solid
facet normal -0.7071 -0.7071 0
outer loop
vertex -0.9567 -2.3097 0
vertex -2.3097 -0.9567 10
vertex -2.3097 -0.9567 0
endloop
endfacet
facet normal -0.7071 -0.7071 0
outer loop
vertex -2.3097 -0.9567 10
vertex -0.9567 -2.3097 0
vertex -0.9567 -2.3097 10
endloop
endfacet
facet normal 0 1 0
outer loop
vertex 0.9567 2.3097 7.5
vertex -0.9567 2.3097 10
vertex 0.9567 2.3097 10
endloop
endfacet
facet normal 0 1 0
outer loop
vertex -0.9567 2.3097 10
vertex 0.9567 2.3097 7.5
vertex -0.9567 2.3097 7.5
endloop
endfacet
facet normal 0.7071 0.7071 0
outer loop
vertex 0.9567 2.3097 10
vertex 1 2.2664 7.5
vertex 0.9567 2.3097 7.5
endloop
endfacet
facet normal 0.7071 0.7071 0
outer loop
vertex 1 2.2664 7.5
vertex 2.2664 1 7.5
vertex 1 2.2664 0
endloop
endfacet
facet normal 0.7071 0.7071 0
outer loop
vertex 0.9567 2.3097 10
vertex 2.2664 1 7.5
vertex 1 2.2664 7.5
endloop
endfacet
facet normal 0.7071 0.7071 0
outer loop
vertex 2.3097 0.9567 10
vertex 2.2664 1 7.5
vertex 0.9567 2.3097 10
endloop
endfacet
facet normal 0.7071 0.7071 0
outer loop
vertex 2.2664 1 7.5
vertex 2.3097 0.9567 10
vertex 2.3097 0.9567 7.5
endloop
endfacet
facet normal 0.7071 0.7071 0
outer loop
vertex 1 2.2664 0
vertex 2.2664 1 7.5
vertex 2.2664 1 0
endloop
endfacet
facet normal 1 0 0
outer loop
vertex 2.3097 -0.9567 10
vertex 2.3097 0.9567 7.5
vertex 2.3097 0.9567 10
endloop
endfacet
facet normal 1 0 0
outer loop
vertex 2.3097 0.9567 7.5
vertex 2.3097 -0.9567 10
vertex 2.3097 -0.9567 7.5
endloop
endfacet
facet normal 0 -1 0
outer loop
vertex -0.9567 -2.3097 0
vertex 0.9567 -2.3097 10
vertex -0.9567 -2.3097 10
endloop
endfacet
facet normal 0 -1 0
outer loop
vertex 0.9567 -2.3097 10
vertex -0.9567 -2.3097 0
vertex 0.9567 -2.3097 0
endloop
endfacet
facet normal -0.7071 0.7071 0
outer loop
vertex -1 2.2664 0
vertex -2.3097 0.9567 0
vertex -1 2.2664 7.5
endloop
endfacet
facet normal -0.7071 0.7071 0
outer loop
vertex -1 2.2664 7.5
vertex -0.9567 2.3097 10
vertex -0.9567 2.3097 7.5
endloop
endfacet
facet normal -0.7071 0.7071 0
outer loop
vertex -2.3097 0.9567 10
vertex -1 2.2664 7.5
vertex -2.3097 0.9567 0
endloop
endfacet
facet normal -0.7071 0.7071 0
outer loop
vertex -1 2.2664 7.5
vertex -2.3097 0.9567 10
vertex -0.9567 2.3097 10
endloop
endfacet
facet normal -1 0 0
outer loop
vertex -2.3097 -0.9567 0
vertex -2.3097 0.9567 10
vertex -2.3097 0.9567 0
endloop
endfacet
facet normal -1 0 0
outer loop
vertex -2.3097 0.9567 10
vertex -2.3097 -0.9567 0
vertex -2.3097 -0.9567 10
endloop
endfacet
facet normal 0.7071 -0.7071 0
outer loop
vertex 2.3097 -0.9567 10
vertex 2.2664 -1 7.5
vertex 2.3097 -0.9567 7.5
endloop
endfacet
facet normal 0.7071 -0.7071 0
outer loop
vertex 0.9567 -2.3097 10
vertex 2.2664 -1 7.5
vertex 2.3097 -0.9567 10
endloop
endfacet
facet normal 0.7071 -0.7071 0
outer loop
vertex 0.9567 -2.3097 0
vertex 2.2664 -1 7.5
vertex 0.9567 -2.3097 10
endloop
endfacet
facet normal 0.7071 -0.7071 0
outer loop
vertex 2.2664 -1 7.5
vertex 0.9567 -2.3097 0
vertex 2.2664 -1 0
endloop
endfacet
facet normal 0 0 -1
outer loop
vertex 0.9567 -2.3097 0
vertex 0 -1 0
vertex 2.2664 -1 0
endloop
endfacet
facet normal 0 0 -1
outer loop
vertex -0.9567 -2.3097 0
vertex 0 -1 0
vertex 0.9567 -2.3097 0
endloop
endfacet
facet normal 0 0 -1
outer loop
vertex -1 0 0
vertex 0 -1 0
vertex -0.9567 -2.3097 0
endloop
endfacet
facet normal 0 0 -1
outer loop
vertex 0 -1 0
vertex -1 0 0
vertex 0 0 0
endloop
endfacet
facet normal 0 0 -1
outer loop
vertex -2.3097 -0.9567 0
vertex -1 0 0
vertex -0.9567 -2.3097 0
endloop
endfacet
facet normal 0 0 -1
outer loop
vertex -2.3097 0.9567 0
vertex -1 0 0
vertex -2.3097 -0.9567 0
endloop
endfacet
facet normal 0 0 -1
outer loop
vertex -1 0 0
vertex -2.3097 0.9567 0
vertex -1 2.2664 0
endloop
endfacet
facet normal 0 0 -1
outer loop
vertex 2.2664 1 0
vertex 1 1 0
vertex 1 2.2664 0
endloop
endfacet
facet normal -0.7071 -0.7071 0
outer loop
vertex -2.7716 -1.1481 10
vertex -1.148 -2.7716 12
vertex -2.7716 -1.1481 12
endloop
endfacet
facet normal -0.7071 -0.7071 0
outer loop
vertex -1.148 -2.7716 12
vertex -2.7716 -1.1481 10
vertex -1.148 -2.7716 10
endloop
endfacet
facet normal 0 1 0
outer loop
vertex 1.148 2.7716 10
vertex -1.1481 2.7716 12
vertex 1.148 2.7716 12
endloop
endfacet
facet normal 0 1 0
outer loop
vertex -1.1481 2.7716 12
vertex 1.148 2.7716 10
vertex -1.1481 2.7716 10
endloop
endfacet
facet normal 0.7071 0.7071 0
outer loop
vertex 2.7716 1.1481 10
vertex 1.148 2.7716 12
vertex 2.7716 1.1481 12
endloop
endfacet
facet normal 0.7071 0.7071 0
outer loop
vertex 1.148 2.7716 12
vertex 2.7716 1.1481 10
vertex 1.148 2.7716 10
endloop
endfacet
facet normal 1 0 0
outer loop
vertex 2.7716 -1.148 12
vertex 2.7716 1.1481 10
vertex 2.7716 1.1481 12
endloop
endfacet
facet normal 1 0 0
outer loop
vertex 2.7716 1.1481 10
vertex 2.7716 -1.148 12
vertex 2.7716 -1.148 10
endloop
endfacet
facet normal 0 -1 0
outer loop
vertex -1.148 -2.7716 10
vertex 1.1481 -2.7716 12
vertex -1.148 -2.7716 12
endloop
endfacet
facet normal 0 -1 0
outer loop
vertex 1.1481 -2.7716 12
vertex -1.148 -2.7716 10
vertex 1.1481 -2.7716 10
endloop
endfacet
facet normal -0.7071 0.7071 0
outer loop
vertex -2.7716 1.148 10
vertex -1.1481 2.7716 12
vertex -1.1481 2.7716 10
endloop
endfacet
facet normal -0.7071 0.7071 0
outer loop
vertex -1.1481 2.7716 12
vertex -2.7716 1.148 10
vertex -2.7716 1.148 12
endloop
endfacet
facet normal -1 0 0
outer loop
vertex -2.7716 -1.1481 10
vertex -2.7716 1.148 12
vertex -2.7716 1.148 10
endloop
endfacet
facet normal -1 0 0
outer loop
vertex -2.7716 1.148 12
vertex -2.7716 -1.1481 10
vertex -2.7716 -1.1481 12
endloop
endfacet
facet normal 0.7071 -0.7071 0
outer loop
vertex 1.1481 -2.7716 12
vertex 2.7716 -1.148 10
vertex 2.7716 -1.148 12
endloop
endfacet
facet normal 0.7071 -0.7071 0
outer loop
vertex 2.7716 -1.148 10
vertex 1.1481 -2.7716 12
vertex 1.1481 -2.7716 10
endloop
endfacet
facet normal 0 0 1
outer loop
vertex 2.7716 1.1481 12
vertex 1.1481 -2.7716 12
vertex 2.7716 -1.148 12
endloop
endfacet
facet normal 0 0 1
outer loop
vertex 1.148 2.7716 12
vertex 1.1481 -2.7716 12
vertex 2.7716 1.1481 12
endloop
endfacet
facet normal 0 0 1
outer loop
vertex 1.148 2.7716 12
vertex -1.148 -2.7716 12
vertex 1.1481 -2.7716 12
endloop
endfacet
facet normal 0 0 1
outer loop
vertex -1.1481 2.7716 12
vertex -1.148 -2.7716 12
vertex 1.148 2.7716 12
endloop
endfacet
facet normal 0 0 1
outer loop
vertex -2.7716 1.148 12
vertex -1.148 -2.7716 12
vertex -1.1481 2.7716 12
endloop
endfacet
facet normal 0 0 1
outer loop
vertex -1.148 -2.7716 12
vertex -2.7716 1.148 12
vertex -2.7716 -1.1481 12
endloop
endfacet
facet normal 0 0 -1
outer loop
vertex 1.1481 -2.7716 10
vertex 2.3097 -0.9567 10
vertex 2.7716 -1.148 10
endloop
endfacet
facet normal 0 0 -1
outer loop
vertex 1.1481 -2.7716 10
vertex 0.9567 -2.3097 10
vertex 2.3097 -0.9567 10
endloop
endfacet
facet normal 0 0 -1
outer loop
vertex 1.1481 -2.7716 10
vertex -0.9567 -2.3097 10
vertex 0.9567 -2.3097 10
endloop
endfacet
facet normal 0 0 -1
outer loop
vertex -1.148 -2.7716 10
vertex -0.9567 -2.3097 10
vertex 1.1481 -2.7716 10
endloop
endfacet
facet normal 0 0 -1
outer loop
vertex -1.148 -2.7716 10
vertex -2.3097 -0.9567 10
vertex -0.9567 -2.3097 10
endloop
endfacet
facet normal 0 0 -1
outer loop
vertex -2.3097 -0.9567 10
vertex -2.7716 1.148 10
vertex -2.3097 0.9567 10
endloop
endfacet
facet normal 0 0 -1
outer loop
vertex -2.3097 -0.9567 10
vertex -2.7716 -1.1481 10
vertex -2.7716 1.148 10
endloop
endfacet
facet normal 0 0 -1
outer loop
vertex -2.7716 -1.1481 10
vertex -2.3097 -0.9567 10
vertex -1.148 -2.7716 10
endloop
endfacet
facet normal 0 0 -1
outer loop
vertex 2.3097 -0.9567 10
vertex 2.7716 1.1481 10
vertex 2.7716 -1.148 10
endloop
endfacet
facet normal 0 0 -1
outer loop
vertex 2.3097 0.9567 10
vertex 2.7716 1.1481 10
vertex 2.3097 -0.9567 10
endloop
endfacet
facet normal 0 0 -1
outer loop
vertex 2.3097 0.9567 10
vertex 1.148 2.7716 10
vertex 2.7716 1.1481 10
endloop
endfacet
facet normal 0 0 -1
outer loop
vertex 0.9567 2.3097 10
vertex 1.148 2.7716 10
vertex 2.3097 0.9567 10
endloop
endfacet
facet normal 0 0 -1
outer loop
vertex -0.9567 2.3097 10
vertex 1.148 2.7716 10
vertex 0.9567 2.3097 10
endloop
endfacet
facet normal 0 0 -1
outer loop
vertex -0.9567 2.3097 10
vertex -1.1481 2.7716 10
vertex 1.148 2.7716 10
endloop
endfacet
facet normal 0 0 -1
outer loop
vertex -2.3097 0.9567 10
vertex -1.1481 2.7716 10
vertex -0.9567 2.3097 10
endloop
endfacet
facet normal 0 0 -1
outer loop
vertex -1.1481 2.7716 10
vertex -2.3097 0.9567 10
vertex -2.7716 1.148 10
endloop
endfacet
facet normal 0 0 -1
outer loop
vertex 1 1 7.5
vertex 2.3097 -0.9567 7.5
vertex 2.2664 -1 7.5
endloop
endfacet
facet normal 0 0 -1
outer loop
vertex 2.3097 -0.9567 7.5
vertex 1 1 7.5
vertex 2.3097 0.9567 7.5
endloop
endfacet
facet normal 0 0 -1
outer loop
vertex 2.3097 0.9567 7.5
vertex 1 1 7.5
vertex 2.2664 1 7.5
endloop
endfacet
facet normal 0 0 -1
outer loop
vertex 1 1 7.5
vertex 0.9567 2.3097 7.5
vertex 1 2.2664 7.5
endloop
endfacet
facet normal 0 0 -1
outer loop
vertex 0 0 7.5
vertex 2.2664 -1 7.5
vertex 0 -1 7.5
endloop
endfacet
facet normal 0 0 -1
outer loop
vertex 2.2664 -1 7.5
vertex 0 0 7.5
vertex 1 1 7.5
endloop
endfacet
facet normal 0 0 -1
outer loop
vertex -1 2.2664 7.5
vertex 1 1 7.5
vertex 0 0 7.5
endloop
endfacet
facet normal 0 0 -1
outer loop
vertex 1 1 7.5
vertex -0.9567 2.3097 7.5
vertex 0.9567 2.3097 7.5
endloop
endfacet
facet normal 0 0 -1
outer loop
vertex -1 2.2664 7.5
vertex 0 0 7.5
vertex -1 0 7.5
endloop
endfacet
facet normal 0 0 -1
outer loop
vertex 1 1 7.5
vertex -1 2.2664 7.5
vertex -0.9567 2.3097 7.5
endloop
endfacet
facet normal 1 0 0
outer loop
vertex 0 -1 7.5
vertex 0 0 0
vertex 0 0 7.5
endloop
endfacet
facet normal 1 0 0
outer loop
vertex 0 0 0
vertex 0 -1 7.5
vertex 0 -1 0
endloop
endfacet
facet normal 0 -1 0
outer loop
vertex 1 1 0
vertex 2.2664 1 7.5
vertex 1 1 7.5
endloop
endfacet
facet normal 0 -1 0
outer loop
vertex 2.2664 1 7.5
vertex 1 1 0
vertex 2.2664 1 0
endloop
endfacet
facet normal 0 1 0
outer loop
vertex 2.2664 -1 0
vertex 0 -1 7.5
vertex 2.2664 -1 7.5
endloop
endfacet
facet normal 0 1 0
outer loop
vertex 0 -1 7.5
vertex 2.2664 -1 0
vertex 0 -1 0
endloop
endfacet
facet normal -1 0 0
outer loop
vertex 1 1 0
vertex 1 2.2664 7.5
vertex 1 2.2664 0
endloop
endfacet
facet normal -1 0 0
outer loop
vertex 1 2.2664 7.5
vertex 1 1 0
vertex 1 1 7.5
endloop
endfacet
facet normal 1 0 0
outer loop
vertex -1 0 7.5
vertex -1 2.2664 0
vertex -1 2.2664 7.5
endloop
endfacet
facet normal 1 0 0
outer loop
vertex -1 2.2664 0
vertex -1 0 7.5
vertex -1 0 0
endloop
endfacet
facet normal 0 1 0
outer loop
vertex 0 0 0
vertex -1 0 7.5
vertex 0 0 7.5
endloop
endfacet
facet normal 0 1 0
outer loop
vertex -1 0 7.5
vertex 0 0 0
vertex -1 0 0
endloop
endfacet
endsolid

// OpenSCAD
module tower (coord) {
	translate(coord) {
		rotate([0, 0, (360/8)/2]) {
			cylinder(11, 2.5, 2.5, $fn=8);
			translate([0, 0, 10])
				cylinder(2, 3, 3, $fn=8);
		}
	}
}

// towers blue
difference () {
	tower([0, 0, 0]);

	//walls are red
		translate ([0, -1, -1]) 
			cube([20, 2, 8.5]);
		translate ([-1, 0, -1]) 
			cube([2, 20, 8.5]);
}
